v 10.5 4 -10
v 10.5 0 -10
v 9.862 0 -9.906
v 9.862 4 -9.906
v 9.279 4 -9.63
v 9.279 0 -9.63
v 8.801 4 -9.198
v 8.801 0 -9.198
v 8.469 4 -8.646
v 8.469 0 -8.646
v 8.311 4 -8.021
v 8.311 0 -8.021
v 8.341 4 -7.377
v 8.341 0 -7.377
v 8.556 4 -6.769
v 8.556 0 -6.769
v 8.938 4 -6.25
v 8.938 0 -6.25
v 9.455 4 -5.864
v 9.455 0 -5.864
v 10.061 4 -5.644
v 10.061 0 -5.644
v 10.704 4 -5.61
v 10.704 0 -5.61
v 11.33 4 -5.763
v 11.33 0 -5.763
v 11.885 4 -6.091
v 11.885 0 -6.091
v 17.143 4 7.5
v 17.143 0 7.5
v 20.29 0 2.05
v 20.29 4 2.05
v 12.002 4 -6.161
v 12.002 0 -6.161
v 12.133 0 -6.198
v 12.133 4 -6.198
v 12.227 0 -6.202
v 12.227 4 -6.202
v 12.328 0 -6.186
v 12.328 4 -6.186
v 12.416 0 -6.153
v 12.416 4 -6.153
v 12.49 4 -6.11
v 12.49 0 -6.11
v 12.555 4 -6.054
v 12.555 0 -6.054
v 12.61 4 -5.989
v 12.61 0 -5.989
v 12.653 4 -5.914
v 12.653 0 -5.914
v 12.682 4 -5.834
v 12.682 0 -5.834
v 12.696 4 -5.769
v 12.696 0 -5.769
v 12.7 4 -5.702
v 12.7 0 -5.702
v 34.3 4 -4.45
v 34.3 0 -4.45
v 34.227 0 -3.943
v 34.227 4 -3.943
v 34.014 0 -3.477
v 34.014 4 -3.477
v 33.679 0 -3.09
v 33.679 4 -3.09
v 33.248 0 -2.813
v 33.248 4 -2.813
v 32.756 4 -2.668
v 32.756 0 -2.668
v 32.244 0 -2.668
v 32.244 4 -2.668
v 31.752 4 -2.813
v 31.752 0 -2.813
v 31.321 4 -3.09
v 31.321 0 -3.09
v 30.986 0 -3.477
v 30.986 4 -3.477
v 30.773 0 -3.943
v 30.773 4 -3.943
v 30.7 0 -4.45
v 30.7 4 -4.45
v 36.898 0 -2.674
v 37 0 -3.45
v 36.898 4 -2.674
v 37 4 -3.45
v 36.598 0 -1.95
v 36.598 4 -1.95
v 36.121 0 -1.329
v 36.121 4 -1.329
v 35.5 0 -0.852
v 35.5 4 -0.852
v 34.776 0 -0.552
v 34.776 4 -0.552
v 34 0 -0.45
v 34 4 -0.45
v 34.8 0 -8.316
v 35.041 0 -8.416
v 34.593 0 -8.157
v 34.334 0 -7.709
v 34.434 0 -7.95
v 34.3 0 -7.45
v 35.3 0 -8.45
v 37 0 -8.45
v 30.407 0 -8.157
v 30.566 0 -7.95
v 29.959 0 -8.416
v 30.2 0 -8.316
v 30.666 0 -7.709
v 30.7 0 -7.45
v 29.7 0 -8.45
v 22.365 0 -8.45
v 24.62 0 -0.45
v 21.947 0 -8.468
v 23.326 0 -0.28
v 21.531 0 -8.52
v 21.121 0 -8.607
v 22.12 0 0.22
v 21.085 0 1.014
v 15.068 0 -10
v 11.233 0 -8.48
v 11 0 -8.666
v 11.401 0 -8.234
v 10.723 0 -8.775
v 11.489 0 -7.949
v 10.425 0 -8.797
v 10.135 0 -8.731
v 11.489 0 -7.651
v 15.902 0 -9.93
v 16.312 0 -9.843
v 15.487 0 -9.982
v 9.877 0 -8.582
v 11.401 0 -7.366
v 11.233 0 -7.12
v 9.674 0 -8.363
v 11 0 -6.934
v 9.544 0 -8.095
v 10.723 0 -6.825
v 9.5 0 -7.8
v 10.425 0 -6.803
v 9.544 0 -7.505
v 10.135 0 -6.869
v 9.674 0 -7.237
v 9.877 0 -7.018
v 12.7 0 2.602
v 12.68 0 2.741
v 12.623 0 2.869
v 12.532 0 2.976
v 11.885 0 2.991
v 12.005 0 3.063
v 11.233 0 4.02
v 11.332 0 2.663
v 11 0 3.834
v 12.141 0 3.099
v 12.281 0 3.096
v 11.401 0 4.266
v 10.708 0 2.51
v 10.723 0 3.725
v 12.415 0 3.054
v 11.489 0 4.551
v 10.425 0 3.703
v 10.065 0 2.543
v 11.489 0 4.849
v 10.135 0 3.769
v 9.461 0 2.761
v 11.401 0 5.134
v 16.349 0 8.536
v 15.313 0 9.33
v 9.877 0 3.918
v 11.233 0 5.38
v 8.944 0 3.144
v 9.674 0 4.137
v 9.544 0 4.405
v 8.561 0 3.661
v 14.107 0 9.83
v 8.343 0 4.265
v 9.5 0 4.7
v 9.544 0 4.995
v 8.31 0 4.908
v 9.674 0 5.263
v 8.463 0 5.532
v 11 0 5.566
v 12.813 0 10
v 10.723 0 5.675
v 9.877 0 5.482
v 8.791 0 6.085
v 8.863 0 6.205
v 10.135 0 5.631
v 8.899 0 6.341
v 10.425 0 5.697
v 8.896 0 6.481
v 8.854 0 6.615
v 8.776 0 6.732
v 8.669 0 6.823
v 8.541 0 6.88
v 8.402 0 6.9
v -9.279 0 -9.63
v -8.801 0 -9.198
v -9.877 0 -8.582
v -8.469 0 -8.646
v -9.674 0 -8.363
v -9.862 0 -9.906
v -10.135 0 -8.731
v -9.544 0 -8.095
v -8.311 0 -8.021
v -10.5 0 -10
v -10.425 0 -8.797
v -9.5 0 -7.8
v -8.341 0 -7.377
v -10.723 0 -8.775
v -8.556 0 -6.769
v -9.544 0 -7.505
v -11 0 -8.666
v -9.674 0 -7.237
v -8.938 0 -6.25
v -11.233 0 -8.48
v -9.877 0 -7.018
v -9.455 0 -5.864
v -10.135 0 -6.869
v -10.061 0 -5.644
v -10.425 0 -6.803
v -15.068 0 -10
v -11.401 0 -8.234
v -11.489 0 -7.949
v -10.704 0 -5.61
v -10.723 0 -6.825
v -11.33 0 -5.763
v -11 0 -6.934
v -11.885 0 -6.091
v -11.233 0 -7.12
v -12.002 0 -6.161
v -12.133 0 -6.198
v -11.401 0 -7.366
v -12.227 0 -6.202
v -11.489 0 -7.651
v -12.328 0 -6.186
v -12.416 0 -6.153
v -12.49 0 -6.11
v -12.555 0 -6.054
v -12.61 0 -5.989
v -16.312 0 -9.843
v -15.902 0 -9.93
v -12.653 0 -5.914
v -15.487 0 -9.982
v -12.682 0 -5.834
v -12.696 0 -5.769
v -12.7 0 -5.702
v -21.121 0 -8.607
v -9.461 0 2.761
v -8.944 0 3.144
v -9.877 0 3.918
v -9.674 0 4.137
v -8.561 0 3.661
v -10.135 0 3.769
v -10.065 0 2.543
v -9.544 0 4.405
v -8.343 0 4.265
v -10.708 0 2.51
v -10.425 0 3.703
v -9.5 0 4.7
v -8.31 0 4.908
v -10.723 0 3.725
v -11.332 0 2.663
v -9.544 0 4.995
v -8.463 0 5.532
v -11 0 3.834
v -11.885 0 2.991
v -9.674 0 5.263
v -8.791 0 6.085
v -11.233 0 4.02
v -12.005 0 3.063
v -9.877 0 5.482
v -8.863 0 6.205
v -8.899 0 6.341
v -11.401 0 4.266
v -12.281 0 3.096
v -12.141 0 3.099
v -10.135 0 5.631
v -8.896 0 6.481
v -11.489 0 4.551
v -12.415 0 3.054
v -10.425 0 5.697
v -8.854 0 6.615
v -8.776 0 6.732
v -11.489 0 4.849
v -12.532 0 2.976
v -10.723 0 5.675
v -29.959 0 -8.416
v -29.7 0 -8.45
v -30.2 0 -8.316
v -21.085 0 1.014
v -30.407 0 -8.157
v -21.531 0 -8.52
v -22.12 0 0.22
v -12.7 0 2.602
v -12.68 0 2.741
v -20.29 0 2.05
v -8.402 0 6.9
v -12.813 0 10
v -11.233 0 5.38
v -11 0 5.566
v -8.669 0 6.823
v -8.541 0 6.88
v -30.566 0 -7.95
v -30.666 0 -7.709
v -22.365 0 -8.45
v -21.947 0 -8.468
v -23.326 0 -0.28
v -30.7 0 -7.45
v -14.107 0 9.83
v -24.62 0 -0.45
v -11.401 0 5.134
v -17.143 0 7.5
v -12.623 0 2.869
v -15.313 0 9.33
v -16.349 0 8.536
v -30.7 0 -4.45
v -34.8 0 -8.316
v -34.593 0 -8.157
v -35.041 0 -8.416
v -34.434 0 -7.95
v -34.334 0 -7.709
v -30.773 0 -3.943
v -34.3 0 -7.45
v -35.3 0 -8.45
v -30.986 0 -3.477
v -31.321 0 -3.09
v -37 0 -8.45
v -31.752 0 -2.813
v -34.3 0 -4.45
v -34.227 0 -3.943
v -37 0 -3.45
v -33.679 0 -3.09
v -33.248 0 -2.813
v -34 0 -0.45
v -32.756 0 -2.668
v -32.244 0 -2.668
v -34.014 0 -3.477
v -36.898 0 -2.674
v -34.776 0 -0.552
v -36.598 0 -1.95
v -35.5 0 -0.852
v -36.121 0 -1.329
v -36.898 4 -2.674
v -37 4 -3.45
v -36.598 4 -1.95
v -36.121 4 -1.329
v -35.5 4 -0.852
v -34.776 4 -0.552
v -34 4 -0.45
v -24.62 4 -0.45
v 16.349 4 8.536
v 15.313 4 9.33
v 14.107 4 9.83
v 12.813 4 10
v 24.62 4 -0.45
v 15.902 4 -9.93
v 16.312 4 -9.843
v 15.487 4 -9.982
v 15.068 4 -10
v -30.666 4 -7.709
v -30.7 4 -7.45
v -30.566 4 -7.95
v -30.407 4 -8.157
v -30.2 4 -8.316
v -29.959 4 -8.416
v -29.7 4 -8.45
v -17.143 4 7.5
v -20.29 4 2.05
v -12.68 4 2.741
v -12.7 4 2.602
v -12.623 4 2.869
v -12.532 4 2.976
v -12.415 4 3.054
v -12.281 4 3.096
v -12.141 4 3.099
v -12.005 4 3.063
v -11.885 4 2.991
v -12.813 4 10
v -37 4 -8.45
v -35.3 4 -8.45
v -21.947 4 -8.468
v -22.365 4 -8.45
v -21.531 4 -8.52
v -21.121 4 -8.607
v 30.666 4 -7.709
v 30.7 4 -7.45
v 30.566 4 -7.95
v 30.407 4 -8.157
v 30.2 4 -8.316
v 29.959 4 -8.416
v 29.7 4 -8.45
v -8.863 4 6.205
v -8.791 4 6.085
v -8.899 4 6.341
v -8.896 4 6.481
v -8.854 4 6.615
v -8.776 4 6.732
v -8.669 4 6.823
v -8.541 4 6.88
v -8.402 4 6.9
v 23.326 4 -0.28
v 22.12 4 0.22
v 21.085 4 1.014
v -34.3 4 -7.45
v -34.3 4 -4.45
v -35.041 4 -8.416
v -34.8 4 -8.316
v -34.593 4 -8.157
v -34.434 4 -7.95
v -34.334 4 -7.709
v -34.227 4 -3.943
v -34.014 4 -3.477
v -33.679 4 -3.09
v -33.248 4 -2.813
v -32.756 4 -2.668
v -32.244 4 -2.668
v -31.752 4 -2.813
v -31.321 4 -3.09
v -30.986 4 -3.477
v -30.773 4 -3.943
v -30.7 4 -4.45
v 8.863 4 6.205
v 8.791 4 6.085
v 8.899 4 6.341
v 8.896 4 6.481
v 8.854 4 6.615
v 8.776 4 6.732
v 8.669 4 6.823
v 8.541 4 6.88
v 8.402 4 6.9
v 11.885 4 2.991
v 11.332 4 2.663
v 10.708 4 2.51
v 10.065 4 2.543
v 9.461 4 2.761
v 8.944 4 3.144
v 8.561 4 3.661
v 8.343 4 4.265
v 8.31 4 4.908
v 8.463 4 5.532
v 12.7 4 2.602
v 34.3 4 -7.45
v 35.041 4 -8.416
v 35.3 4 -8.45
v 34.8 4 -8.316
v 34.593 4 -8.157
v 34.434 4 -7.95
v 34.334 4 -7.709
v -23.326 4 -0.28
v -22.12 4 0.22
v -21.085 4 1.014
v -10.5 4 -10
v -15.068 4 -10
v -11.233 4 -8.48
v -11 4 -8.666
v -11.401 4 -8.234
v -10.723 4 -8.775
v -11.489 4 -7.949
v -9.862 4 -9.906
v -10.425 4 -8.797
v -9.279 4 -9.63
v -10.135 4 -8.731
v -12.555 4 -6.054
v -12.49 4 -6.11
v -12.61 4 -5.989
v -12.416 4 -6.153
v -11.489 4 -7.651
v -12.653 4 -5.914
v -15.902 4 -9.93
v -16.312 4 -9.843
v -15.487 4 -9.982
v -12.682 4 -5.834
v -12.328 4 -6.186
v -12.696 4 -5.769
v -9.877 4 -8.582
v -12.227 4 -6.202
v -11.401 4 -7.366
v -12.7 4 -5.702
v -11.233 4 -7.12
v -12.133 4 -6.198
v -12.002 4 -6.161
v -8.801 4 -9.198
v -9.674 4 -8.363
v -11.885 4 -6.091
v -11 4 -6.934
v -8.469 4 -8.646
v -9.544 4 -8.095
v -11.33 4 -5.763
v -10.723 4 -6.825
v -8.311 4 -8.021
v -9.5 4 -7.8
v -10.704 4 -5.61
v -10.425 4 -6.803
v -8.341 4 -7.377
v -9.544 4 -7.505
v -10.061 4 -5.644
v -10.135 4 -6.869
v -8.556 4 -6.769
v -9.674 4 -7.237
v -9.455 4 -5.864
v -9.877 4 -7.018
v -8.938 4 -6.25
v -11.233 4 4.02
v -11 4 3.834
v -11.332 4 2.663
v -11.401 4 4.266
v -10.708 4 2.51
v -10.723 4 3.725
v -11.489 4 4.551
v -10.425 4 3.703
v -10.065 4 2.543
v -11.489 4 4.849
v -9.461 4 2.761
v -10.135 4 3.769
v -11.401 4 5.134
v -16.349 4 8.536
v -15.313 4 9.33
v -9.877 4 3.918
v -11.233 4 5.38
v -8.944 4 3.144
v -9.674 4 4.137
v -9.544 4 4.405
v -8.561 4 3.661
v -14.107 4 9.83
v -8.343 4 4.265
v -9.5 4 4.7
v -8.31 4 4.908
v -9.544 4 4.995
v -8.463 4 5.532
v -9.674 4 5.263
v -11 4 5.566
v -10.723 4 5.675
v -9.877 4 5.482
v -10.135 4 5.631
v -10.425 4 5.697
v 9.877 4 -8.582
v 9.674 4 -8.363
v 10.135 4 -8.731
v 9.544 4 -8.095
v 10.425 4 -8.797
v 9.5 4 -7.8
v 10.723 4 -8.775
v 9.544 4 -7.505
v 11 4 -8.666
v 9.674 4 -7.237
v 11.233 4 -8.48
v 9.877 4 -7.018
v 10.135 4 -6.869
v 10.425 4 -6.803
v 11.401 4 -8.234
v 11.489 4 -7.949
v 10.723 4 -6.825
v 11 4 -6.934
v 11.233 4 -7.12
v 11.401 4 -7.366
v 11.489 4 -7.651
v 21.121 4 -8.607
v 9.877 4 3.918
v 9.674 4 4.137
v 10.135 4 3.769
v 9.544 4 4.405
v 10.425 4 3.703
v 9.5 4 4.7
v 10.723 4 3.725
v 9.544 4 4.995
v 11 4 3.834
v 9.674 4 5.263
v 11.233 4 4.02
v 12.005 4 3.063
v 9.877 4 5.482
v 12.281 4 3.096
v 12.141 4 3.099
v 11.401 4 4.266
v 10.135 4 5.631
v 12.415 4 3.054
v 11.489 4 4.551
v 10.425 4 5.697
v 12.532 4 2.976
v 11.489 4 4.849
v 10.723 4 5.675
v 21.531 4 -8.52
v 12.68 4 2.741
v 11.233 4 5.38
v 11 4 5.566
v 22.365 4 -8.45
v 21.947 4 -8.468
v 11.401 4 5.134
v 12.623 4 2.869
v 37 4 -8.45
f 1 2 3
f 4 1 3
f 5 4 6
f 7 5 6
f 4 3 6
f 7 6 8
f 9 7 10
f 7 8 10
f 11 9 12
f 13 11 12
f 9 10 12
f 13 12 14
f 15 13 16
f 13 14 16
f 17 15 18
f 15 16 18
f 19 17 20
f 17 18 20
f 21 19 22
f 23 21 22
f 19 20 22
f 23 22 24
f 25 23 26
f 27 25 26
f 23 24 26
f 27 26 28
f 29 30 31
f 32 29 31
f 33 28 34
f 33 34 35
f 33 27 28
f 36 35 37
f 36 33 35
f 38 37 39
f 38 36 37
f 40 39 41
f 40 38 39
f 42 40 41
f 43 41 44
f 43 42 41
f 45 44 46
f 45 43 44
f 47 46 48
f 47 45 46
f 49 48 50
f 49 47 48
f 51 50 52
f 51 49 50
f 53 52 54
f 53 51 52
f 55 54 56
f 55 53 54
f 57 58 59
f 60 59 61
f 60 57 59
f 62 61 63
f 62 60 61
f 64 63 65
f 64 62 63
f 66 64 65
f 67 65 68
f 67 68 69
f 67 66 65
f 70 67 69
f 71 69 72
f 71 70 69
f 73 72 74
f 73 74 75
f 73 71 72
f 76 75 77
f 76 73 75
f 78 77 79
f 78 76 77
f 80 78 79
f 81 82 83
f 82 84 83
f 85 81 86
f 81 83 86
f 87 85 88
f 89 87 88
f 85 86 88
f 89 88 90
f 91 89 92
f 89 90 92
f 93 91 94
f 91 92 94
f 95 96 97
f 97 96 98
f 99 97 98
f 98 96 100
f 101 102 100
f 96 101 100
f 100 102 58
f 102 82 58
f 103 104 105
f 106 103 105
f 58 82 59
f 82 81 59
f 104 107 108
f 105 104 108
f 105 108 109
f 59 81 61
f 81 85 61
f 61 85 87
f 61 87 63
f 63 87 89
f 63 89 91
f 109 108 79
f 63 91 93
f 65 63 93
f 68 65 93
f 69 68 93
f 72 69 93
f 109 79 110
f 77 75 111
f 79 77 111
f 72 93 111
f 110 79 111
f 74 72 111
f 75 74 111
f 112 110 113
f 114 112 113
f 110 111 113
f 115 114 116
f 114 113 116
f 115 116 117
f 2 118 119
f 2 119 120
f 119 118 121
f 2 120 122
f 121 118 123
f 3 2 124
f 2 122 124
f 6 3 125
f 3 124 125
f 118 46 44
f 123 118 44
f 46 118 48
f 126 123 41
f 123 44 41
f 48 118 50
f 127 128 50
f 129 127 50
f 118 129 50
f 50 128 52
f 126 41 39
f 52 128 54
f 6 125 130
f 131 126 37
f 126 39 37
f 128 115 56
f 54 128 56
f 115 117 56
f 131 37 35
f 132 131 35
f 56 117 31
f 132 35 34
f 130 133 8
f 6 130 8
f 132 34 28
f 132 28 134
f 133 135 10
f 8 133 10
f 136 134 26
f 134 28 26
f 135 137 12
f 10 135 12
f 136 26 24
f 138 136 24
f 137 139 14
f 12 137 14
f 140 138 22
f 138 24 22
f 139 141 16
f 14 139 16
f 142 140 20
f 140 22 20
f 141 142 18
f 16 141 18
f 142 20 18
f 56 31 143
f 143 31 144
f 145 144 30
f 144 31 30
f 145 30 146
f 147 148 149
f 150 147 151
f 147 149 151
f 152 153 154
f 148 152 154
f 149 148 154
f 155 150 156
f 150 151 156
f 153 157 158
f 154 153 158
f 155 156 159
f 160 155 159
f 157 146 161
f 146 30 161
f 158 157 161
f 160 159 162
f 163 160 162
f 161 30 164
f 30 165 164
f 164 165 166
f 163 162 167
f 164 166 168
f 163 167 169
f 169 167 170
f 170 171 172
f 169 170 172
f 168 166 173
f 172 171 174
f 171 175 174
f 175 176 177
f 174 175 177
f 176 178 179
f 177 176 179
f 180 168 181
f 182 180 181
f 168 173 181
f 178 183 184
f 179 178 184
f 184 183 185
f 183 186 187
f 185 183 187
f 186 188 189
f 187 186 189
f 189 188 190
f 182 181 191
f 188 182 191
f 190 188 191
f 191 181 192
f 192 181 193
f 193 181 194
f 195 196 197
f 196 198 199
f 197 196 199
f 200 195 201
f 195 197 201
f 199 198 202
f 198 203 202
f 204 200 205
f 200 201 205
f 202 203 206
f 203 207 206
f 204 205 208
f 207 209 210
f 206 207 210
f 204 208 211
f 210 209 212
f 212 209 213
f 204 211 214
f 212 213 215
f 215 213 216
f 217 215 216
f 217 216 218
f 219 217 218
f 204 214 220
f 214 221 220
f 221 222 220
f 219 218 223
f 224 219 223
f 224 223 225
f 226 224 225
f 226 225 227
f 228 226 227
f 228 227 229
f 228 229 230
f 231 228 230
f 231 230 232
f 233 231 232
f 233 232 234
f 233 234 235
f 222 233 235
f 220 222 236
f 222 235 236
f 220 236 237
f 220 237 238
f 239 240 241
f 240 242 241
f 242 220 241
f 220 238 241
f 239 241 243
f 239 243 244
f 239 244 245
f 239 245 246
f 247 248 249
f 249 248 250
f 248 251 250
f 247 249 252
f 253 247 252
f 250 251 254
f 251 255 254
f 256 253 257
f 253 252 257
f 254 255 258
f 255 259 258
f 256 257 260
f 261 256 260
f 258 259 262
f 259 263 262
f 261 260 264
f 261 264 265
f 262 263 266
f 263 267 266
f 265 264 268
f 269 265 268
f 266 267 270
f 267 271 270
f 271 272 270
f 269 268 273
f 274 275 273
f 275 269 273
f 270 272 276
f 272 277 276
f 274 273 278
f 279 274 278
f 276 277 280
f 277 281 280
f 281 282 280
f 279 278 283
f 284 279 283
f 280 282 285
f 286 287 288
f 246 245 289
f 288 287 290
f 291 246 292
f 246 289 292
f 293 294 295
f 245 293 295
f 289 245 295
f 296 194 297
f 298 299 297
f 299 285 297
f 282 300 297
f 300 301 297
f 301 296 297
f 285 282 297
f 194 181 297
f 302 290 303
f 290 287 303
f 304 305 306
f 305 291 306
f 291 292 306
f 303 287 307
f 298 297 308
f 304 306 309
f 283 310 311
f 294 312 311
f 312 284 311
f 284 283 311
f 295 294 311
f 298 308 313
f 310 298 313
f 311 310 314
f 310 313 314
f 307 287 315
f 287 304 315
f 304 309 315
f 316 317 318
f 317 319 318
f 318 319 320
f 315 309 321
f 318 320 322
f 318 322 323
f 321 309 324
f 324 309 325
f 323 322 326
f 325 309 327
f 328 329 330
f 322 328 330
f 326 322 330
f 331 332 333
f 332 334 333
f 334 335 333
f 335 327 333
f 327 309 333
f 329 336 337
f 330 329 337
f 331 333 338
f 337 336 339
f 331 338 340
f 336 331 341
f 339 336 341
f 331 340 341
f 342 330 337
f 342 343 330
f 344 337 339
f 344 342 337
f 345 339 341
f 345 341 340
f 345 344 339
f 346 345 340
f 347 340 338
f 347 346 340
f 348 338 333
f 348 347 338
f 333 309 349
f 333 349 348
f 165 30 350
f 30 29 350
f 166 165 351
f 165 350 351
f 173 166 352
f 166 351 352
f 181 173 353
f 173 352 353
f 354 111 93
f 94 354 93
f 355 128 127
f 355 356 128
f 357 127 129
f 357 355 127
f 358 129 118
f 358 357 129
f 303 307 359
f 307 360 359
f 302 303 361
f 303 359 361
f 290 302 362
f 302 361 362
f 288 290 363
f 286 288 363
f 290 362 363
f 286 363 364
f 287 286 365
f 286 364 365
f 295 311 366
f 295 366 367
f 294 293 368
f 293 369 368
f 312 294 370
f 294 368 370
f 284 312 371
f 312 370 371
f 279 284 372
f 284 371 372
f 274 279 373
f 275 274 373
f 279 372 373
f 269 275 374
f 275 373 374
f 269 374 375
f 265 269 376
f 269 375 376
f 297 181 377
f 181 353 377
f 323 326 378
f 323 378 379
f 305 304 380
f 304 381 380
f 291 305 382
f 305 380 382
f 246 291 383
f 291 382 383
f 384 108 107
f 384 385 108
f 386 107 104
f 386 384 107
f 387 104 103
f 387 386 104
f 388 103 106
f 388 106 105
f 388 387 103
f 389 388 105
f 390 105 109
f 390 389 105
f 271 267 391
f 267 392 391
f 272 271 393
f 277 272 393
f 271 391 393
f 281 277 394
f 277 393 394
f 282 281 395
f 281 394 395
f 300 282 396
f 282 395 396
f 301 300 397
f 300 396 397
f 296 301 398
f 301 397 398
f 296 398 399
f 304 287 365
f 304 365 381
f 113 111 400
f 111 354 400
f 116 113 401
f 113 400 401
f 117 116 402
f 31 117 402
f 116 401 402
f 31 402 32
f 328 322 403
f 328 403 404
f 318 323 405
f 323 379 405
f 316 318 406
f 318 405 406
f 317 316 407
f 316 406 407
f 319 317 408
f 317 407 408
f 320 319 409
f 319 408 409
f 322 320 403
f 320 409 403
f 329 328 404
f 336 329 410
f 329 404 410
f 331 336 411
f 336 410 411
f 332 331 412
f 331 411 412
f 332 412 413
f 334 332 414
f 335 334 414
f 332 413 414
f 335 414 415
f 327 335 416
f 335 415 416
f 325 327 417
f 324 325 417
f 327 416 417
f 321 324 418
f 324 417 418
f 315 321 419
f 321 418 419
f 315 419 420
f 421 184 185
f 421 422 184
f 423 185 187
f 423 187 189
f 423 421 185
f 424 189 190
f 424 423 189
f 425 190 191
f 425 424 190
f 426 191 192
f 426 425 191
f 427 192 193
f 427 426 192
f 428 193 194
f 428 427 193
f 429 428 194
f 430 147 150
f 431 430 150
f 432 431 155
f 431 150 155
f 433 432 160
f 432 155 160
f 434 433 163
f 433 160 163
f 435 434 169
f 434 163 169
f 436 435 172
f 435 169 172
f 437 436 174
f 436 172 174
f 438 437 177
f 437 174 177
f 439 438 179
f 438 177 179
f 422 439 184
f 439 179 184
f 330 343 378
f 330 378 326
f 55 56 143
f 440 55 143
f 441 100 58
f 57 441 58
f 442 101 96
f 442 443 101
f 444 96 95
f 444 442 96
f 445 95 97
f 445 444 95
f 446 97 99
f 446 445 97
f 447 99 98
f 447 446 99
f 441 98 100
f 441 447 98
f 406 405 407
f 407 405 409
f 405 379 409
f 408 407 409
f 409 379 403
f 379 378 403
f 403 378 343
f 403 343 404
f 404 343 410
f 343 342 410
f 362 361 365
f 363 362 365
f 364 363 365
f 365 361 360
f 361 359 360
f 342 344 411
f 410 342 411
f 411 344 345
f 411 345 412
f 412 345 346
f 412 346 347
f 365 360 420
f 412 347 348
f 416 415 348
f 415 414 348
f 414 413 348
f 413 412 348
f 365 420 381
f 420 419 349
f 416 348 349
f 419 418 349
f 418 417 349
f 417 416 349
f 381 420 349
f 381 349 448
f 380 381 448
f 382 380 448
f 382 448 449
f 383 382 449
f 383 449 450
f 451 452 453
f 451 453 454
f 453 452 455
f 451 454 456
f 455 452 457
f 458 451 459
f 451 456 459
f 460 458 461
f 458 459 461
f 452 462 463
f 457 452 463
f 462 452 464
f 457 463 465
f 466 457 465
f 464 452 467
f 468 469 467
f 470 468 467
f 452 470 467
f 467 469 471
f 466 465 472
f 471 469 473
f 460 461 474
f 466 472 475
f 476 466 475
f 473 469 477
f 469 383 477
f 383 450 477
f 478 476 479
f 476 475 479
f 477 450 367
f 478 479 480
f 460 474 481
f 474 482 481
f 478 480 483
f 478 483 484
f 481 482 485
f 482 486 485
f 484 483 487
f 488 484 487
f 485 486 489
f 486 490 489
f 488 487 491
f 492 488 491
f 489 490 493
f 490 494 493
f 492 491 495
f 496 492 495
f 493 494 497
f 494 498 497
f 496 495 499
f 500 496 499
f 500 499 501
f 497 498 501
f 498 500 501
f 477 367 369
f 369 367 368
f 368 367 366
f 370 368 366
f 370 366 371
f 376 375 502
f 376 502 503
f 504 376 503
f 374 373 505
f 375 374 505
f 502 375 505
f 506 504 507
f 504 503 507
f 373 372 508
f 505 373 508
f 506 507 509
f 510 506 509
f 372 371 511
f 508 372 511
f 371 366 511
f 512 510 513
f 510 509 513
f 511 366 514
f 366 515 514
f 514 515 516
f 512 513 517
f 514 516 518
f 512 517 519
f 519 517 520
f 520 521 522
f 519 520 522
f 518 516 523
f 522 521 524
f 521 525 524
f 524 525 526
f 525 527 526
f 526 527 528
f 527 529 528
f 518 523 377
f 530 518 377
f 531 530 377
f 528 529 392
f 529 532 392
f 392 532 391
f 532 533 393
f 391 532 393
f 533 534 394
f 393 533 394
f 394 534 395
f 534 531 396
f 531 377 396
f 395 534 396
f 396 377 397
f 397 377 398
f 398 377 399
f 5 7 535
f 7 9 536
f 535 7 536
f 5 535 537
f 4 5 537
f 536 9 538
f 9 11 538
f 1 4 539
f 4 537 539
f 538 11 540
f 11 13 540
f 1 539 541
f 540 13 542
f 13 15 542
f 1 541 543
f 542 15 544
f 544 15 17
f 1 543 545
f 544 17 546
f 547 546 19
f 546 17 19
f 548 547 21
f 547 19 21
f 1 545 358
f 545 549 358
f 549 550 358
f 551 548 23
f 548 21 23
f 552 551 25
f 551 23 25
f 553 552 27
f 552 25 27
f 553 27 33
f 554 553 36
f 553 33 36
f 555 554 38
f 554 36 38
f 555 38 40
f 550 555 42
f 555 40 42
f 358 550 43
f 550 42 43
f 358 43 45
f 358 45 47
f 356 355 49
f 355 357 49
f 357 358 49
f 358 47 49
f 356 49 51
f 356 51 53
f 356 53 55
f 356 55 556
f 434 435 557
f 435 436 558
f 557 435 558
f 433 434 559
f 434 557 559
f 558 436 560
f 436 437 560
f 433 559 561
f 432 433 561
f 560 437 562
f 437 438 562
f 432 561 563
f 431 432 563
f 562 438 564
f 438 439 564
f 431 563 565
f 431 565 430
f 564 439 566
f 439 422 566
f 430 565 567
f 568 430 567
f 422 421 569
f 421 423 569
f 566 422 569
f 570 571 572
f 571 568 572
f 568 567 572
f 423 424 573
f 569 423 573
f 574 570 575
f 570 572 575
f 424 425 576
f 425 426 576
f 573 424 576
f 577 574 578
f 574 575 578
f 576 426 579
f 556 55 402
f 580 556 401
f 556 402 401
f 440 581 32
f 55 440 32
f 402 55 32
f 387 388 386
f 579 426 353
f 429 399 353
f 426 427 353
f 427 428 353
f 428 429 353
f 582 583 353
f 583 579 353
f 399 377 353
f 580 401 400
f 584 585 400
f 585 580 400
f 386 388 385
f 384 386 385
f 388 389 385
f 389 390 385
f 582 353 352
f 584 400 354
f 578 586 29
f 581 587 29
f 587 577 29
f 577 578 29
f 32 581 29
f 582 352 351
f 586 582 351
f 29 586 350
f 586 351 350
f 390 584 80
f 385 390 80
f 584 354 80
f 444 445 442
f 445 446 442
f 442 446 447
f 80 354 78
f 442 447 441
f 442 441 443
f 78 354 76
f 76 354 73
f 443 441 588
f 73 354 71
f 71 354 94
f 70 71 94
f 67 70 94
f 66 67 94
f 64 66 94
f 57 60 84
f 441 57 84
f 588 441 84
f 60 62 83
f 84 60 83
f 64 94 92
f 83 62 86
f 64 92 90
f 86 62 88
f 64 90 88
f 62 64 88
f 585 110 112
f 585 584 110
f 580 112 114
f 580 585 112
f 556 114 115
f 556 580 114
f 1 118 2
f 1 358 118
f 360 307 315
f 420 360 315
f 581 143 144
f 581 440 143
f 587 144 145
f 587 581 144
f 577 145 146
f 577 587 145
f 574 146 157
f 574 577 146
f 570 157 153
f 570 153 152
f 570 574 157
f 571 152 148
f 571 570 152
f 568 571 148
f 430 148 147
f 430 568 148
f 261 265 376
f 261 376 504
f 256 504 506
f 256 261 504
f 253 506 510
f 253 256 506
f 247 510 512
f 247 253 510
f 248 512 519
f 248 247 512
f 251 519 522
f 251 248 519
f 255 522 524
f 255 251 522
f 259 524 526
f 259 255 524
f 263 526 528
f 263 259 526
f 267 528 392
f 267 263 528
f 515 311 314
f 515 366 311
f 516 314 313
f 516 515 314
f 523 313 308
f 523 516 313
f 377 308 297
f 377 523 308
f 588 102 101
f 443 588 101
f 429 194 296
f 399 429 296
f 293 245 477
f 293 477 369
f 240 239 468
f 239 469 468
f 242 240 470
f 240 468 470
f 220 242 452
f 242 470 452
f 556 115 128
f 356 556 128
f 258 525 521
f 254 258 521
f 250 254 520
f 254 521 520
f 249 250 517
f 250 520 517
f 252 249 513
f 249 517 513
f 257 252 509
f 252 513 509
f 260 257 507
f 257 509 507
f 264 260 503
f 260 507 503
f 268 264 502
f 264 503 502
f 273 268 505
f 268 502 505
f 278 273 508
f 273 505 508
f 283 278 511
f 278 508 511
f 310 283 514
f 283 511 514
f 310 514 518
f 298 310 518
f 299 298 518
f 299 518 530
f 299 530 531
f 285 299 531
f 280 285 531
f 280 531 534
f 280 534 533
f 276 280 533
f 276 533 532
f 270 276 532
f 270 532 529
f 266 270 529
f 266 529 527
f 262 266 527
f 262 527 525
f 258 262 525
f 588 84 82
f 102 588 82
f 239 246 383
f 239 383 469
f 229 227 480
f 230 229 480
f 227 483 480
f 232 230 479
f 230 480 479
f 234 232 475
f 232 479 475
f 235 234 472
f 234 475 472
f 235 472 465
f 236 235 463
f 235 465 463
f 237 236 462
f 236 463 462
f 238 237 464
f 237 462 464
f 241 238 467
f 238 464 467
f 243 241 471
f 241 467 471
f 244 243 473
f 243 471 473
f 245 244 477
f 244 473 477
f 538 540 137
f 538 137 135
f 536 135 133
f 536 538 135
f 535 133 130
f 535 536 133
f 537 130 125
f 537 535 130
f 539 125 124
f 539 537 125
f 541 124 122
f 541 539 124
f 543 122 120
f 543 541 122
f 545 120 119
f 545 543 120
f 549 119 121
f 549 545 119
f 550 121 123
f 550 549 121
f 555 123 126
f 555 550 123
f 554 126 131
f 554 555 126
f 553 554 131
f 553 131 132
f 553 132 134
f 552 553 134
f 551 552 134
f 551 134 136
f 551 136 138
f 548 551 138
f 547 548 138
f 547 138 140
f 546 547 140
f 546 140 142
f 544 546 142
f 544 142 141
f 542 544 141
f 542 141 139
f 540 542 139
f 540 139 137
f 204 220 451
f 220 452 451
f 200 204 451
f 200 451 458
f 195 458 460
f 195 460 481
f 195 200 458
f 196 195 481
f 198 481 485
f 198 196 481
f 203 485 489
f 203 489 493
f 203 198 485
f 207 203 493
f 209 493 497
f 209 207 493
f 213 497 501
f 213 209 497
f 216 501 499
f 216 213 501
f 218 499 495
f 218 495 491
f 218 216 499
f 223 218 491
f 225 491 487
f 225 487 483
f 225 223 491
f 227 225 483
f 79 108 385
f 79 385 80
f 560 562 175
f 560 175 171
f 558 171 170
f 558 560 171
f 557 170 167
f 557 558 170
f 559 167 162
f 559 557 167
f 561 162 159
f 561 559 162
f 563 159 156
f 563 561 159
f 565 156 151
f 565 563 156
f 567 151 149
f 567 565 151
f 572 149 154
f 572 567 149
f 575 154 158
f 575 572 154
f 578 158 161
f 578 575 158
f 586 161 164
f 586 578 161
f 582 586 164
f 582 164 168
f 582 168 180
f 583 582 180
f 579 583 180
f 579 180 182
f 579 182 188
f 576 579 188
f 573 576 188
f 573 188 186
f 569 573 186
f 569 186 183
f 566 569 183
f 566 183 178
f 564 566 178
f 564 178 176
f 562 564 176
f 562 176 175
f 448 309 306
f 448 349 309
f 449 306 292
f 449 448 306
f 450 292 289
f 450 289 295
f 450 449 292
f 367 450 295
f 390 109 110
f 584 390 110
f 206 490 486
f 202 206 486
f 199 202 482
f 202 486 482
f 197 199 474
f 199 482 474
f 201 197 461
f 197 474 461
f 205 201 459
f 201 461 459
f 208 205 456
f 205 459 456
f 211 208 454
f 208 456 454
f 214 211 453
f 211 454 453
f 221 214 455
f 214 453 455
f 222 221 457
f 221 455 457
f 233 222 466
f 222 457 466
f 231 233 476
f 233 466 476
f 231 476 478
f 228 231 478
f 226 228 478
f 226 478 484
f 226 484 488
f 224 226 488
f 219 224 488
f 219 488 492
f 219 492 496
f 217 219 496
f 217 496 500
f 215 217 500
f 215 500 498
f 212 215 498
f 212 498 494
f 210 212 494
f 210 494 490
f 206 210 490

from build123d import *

# Parameters (mm, degrees)
BOSS_EXTRUDE1_DEPTH      = 10
SKETCH2_OUTSIDE_W        = 47.45
SKETCH2_OUTSIDE_H        = 30.449999999999996
CUT_EXTRUDE1_DEPTH       = 20
F_2_0MM_DOWEL_HOLE1_D    = 2
M3_CLEARANCE_HOLE1_D     = 3.6
M3_CLEARANCE_HOLE1_DEPTH = 4
M3_CLEARANCE_HOLE1_TIP   = 1.0815491142496085
FILLET2_R                = 3
FILLET3_R                = 5
FILLET5_R                = 0.5
CUT_EXTRUDE2_REACH       = 40.536
SKETCH14_W               = 3.6000000000000014
SKETCH14_H               = 4
FILLET6_R                = 1


with BuildPart() as part:
    # Sketch1 → Boss-Extrude1 (new, symmetric)
    with BuildSketch(Plane.XY):
        Polygon((0, 0), (0, 4), (-37, 3.9999999999999956), (-37, 0), align=None)
    extrude(amount=BOSS_EXTRUDE1_DEPTH, both=True)

    # Sketch2 outside → Cut-Extrude1 (cut)
    with BuildSketch(Plane.XZ):
        with Locations((-18.5, 0)):
            Rectangle(SKETCH2_OUTSIDE_W, SKETCH2_OUTSIDE_H)
        with BuildLine():
            Line((-12.7, -7.800000000000001), (-12.699999999999998, 4.7))
            ThreePointArc((-12.699999999999998, 4.7), (-8.944365081389599, 3.144365081389597), (-10.5, 6.899999999999999))
            Line((-10.5, 6.899999999999999), (3.8e-16, 6.9))
            Line((3.8e-16, 6.9), (0, 10))
            Line((0, 10), (-15.699999999999996, 10.000000000000002))
            Line((-15.699999999999996, 10.000000000000002), (-21.733310313031556, -0.449999999999999))
            Line((-21.733310313031556, -0.449999999999999), (-37, -0.4499999999999973))
            Line((-37, -0.4499999999999973), (-37, -8.450000000000001))
            Line((-37, -8.450000000000001), (-21.733310313031556, -8.45))
            Line((-21.733310313031556, -8.45), (-15.699999999999996, -10.000000000000002))
            Line((-15.699999999999996, -10.000000000000002), (-10.499999999999998, -9.999999999999998))
            ThreePointArc((-10.499999999999998, -9.999999999999998), (-8.944365081389593, -6.244365081389596), (-12.7, -7.800000000000001))
        make_face(mode=Mode.SUBTRACT)
    extrude(amount=-CUT_EXTRUDE1_DEPTH, mode=Mode.SUBTRACT)

    # Ø2.0mm Dowel Hole1 (through all)
    with Locations(Plane(origin=(0, 0, 0), x_dir=(-1, 0, 0), z_dir=(0, -1, 0))):
        with Locations((10.5, -4.7), (10.5, 7.8)):
            Hole(F_2_0MM_DOWEL_HOLE1_D / 2)

    # M3 Clearance Hole1
    with Locations(Plane(origin=(0, 0, 0), x_dir=(-1, 0, 0), z_dir=(0, -1, 0))):
        with Locations((32.5, 4.45)):
            Hole(M3_CLEARANCE_HOLE1_D / 2, depth=M3_CLEARANCE_HOLE1_DEPTH)
            with Locations((0, 0, -(M3_CLEARANCE_HOLE1_DEPTH + M3_CLEARANCE_HOLE1_TIP / 2))):  # 118° drill point
                Cone(0, M3_CLEARANCE_HOLE1_D / 2, M3_CLEARANCE_HOLE1_TIP, mode=Mode.SUBTRACT)

    # Fillet2
    fillet2_edges = [part.edges().sort_by_distance(p)[0] for p in [
        (-37, 1.9999999999999978, -0.4499999999999973),
    ]]
    fillet(fillet2_edges, radius=FILLET2_R)

    # Fillet3
    fillet3_edges = [part.edges().sort_by_distance(p)[0] for p in [
        (-15.699999999999996, 1.9999999999999991, 10.000000000000002),
        (-15.699999999999996, 1.9999999999999991, -10.000000000000002),
        (-21.733310313031556, 1.9999999999999987, -0.449999999999999),
        (-21.733310313031556, 1.9999999999999987, -8.45),
    ]]
    fillet(fillet3_edges, radius=FILLET3_R)

    # Fillet5
    fillet5_edges = [part.edges().sort_by_distance(p)[0] for p in [
        (-10.5, 1.9999999999999993, 6.899999999999999),
        (-12.699999999999998, 1.9999999999999993, 4.7),
        (-12.7, 1.9999999999999993, -7.800000000000001),
    ]]
    fillet(fillet5_edges, radius=FILLET5_R)

    # Sketch14 → Cut-Extrude2 (cut, up to next)
    with BuildSketch(Plane.XZ, mode=Mode.PRIVATE) as cut_extrude2_sk1:
        with Locations((-32.5, -6.449999999999999)):
            Rectangle(SKETCH14_W, SKETCH14_H)
    cut_extrude2_tool1 = extrude(cut_extrude2_sk1.sketch, amount=-CUT_EXTRUDE2_REACH, mode=Mode.PRIVATE) & part.part
    add(cut_extrude2_tool1.solids().sort_by_distance((-32.5, 0, -6.45))[0], mode=Mode.SUBTRACT)

    # Fillet6
    fillet6_edges = [part.edges().sort_by_distance(p)[0] for p in [
        (-30.700000000000003, 1.9999999999999982, -8.45),
        (-34.300000000000004, 1.999999999999998, -8.45),
    ]]
    fillet(fillet6_edges, radius=FILLET6_R)

    # Mirror1: part across plane


with BuildPart() as part_1:
    add(part.part)
    add(part.part.mirror(Plane(origin=(0, 0, -10), x_dir=(0, 0, 1), z_dir=(1, 0, 0))))


solid = part_1.part
